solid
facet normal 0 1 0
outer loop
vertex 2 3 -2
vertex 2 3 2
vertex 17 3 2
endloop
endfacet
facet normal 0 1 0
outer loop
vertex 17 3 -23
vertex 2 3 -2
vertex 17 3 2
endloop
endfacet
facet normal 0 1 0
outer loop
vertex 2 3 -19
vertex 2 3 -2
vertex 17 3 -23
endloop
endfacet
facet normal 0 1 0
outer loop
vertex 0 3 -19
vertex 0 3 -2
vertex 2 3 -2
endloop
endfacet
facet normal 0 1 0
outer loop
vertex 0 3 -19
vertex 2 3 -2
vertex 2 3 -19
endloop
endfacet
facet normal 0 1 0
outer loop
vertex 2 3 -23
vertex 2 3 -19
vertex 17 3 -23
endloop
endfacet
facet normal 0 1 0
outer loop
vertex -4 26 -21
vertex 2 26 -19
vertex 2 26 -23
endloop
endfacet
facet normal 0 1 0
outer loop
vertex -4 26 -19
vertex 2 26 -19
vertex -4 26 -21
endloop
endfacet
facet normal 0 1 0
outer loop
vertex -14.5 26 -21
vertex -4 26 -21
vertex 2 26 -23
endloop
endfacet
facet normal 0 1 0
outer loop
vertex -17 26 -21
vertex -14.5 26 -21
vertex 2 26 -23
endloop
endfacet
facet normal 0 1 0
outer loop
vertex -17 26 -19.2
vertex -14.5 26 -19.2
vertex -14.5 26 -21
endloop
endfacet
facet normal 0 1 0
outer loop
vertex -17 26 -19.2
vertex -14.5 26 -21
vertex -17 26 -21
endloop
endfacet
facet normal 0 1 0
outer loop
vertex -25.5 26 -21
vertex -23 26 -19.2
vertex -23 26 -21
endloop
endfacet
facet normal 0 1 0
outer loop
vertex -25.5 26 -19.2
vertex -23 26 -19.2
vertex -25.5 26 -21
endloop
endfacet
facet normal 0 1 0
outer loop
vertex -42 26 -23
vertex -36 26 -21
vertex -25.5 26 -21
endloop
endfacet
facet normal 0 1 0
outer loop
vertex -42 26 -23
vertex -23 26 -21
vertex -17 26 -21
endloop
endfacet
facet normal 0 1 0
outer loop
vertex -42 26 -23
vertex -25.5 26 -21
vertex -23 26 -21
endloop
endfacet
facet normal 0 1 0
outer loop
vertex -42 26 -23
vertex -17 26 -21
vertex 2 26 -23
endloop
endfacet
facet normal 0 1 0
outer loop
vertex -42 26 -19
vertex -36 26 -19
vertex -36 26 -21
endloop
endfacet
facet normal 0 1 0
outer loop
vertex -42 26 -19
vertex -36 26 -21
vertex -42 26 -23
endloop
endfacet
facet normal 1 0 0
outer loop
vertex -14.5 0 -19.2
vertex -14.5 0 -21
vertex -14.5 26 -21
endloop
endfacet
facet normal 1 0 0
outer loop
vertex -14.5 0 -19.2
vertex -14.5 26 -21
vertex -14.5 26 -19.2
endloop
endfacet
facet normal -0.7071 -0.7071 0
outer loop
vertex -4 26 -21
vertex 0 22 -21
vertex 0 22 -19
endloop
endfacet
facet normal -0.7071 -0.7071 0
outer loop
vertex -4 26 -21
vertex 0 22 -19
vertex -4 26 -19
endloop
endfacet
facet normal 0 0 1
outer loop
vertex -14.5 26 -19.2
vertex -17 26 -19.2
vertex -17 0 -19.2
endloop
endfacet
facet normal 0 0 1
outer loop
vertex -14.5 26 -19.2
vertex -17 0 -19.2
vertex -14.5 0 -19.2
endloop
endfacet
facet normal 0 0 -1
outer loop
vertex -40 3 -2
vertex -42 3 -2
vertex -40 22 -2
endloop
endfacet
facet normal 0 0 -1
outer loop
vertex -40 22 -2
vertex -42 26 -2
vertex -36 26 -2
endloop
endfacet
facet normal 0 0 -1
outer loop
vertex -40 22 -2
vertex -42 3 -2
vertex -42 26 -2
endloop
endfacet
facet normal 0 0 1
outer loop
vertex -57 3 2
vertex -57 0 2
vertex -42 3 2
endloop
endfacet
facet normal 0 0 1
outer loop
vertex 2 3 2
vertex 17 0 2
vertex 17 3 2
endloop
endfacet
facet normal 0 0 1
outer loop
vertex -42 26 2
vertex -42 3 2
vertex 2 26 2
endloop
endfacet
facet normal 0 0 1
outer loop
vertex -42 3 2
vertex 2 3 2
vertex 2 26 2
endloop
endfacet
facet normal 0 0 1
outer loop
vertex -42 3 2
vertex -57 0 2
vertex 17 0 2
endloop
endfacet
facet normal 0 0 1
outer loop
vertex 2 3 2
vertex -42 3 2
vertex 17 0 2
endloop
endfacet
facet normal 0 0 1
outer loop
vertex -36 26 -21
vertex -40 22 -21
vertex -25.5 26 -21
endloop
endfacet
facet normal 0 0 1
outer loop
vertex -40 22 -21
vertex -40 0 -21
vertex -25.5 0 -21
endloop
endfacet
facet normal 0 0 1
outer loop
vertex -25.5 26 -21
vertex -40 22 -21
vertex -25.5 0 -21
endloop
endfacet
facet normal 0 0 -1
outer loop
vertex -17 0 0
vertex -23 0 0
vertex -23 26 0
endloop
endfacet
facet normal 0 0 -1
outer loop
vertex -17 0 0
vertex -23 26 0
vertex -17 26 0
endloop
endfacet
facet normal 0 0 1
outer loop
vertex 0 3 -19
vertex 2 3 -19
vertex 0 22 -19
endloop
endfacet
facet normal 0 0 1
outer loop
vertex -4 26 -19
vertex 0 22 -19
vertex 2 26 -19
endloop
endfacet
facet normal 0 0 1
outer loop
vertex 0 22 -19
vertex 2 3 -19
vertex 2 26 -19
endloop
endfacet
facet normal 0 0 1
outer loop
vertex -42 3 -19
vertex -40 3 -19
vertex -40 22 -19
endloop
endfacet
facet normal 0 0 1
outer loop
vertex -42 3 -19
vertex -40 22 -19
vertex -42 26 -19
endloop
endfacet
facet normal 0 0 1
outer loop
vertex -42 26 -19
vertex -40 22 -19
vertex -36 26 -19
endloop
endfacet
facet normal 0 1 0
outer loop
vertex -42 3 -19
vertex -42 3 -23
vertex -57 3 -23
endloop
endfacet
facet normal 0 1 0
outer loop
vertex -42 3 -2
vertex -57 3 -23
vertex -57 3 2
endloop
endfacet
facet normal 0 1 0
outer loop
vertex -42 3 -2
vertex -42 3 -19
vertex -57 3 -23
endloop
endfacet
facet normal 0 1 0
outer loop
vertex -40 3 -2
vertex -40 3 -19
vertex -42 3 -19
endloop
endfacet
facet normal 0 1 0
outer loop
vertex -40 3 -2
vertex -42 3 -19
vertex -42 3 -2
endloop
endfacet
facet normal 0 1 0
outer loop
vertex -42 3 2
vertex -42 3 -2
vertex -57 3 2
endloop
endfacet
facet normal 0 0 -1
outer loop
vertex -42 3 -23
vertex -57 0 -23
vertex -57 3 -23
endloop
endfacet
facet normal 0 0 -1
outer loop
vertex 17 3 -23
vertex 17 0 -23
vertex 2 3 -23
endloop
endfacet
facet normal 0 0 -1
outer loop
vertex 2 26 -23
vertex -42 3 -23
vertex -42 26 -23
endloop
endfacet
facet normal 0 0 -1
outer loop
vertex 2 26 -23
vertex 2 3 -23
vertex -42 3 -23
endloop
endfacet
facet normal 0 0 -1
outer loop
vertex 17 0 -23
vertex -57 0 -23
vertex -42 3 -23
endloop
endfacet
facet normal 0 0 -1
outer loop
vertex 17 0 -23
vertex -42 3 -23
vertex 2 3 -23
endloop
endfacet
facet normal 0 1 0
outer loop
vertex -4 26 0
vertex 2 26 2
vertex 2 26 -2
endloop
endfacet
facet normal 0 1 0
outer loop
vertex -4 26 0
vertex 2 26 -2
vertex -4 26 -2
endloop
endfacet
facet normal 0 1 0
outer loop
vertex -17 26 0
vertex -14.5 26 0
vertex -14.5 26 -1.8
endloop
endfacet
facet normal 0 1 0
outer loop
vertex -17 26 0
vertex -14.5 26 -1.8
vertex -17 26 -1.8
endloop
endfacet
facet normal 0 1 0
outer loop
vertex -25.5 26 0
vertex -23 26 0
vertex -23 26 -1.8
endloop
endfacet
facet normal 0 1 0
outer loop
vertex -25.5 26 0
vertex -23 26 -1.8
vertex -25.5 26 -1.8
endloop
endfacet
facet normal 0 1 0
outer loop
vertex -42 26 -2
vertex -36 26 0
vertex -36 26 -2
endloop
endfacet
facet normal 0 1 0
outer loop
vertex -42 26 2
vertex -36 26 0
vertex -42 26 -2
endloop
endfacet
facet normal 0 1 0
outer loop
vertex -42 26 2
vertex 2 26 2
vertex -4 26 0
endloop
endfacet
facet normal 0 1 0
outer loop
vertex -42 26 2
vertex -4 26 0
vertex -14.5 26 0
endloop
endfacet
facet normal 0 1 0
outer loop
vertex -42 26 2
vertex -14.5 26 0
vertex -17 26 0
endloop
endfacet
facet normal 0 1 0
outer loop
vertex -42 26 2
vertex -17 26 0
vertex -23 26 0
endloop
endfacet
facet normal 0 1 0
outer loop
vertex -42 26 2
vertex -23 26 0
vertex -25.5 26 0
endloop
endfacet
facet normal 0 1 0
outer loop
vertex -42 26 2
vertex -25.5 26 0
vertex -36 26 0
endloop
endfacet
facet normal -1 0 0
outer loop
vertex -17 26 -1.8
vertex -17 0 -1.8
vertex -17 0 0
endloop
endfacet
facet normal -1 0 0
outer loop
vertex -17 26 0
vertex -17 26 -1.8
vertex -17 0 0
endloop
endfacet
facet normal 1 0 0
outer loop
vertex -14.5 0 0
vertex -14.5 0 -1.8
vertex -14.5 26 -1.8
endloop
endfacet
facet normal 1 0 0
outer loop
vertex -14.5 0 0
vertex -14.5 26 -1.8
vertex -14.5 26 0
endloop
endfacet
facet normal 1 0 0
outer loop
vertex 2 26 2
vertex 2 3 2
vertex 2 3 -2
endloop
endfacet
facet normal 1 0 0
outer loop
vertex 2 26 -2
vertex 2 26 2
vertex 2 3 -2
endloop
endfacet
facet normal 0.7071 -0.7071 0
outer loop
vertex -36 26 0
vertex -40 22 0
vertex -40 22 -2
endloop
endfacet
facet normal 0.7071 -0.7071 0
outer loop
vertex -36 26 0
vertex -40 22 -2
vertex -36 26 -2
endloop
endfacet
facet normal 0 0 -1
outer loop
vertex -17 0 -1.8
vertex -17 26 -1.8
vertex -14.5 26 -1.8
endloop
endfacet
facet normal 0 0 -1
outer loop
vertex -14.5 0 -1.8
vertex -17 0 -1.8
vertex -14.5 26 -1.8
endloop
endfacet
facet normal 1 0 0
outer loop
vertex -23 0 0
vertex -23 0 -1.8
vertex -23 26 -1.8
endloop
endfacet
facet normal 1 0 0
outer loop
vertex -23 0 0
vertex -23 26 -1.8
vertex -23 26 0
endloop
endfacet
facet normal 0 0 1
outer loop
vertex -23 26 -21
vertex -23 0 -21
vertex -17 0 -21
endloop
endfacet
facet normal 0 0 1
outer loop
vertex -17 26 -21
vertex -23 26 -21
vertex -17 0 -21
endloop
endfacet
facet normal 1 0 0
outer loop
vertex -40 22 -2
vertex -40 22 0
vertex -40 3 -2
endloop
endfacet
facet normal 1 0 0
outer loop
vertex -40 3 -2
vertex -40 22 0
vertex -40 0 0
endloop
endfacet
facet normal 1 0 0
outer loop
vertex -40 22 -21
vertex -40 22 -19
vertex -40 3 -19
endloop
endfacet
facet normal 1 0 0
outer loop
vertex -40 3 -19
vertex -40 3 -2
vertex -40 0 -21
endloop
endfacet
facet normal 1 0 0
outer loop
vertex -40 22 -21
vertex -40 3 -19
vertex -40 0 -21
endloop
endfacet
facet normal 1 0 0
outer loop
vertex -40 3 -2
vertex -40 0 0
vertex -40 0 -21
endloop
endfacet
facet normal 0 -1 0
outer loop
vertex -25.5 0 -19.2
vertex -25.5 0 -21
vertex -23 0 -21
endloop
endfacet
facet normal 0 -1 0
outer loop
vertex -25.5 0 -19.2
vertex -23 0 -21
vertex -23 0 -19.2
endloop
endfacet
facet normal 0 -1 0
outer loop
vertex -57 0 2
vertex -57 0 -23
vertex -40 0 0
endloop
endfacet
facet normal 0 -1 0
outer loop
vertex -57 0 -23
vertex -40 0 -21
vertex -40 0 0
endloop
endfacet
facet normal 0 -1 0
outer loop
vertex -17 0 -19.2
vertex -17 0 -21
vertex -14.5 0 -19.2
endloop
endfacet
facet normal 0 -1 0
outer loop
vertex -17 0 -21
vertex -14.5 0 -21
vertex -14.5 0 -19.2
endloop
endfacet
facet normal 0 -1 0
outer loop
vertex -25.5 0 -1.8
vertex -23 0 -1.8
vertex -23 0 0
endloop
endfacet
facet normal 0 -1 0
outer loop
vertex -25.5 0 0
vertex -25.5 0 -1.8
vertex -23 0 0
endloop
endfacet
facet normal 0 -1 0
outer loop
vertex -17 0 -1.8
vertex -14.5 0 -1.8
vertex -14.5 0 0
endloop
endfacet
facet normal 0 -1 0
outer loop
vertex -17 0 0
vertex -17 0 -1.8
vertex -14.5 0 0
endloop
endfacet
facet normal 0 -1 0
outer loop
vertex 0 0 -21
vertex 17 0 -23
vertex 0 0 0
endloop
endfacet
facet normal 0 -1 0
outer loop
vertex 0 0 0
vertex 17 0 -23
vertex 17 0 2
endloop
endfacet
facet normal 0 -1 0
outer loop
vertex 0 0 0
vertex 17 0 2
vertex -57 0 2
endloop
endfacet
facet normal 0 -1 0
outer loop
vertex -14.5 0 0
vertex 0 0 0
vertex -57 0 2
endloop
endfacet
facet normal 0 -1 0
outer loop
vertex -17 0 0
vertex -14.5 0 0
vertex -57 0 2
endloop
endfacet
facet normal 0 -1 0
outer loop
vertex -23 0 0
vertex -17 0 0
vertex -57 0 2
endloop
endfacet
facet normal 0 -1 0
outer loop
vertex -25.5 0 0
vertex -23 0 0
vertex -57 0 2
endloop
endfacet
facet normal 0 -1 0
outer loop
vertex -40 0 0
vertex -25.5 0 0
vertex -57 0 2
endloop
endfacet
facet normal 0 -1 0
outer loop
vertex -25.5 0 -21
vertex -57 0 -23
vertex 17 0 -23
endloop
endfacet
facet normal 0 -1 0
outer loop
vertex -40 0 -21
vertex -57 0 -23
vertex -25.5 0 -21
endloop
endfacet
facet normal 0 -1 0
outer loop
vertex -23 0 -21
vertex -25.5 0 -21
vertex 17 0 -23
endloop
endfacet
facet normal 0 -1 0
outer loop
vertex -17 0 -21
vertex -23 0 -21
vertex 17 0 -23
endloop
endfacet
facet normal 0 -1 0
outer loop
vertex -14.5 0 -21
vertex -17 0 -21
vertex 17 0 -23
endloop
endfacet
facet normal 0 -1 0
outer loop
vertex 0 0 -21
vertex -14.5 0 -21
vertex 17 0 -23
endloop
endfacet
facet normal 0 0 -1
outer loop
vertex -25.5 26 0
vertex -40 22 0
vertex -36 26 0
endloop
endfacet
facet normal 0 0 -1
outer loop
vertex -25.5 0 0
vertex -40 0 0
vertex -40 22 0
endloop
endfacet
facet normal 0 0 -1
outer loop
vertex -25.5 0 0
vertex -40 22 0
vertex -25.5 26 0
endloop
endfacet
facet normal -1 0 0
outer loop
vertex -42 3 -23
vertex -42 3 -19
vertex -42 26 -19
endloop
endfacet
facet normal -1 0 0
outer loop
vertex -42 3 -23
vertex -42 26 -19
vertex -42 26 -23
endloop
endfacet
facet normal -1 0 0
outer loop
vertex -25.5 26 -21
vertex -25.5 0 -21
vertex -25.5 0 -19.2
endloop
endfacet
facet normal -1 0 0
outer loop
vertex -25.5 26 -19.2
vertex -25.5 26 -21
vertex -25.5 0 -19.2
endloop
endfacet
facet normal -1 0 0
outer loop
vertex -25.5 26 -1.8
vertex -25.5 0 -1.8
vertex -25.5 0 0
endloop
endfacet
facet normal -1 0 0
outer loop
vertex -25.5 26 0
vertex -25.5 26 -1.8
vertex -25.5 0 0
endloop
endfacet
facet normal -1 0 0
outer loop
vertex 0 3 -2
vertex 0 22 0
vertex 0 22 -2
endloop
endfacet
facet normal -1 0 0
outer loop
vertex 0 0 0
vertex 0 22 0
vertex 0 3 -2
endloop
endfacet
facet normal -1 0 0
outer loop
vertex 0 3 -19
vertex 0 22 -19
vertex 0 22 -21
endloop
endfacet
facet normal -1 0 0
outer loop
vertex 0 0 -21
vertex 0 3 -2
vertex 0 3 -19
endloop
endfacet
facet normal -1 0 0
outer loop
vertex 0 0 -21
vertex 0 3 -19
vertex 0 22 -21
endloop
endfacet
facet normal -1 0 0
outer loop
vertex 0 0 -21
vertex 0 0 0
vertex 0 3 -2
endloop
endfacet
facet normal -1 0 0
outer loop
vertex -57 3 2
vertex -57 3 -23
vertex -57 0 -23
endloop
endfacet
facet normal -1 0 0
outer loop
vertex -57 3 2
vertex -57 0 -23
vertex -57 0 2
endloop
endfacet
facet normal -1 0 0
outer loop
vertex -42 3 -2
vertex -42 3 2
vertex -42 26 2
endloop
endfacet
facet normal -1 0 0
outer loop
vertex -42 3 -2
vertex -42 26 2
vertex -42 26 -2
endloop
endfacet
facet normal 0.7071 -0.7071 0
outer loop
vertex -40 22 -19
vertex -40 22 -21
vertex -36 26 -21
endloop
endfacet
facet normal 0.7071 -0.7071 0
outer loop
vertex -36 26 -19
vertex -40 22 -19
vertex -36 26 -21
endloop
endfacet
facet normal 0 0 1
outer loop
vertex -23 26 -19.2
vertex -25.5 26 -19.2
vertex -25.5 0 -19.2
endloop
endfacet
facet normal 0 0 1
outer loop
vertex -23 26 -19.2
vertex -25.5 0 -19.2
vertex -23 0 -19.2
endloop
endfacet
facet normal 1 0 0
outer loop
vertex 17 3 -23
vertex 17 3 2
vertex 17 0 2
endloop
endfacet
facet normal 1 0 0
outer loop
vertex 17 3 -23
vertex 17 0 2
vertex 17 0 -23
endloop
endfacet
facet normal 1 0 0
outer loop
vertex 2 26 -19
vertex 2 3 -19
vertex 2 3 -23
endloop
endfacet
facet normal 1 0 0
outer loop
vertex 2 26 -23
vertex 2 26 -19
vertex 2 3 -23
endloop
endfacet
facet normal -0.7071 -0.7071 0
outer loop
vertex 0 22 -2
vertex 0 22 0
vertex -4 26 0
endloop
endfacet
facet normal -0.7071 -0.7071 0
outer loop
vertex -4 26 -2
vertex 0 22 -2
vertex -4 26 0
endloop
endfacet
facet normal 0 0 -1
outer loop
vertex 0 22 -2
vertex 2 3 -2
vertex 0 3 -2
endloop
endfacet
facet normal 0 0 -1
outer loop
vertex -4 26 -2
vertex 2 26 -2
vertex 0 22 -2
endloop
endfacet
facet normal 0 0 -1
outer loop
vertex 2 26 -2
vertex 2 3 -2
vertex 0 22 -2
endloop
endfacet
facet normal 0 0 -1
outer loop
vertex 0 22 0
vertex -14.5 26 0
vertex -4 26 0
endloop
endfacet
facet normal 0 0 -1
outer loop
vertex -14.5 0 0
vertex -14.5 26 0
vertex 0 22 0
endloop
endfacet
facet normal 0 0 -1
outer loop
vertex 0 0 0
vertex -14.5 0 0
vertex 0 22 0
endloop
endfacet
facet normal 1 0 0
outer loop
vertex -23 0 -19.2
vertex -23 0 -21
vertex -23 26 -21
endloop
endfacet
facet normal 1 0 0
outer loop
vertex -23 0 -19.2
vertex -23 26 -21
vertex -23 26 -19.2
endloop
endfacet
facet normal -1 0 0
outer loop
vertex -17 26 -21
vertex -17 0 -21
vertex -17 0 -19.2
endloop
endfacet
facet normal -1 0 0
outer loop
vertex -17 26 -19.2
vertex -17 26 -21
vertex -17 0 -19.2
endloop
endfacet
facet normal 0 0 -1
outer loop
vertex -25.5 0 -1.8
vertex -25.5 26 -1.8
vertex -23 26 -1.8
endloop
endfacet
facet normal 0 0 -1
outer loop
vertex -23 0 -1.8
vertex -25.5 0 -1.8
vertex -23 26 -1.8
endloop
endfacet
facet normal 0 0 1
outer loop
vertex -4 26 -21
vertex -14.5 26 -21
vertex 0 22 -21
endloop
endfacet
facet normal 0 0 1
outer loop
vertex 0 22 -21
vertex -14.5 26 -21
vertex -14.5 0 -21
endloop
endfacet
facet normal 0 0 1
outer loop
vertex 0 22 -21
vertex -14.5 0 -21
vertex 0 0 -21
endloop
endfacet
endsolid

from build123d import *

# Parameters (mm, degrees)
SKETCH1_W           = 44
SKETCH1_H           = 25
SKETCH1_W_2         = 40
SKETCH1_H_2         = 21
BOSS_EXTRUDE1_DEPTH = 26
BOSS_EXTRUDE2_DEPTH = 2
SKETCH3_W           = 17
SKETCH3_H           = 23
CUT_EXTRUDE1_DEPTH  = 57
SKETCH4_W           = 2.5
SKETCH4_H           = 1.8
BOSS_EXTRUDE3_DEPTH = 26
SKETCH8_W           = 25
SKETCH8_H           = 3
BOSS_EXTRUDE5_DEPTH = 15
SKETCH9_W           = 25
SKETCH9_H           = 3
BOSS_EXTRUDE6_DEPTH = 15


with BuildPart() as part:
    # Sketch1 → Boss-Extrude1 (new body)
    with BuildSketch(Plane(origin=(0, 0, 0), x_dir=(1, 0, 0), z_dir=(0, 1, 0))):
        with Locations((-20, 10.5)):
            Rectangle(SKETCH1_W, SKETCH1_H)
        with Locations((-20, 10.5)):
            Rectangle(SKETCH1_W_2, SKETCH1_H_2, mode=Mode.SUBTRACT)
    extrude(amount=BOSS_EXTRUDE1_DEPTH)

    # Sketch2 → Boss-Extrude2 (add)
    with BuildSketch(Plane.XY.offset(-21)):
        Polygon((-40, 22), (-36, 26), (-40, 26), align=None)
        Polygon((0, 26), (0, 22), (-4, 26), align=None)
    boss_extrude2 = extrude(amount=BOSS_EXTRUDE2_DEPTH)

    # Mirror1: Boss-Extrude2 across plane
    add(boss_extrude2.mirror(Plane(origin=(0, 0, -10.5), x_dir=(1, 0, 0), z_dir=(0, 0, -1))))

    # Sketch3 → Cut-Extrude1 (cut, symmetric)
    with BuildSketch(Plane(origin=(-40, 0, 0), x_dir=(0, 0, -1), z_dir=(1, 0, 0))):
        with Locations((10.5, 14.5)):
            Rectangle(SKETCH3_W, SKETCH3_H)
    extrude(amount=CUT_EXTRUDE1_DEPTH, both=True, mode=Mode.SUBTRACT)

    # Sketch4 → Boss-Extrude3 (add)
    with BuildSketch(Plane.XZ):
        with Locations((-24.25, -0.9)):
            Rectangle(SKETCH4_W, SKETCH4_H)
        with Locations((-15.75, -0.9)):
            Rectangle(SKETCH4_W, SKETCH4_H)
        with Locations((-15.75, -20.1)):
            Rectangle(SKETCH4_W, SKETCH4_H)
        with Locations((-24.25, -20.1)):
            Rectangle(SKETCH4_W, SKETCH4_H)
    extrude(amount=-BOSS_EXTRUDE3_DEPTH)

    # Sketch8 → Boss-Extrude5 (add)
    with BuildSketch(Plane(origin=(2, 0, 0), x_dir=(0, 0, -1), z_dir=(1, 0, 0))):
        with Locations((10.5, 1.5)):
            Rectangle(SKETCH8_W, SKETCH8_H)
    extrude(amount=BOSS_EXTRUDE5_DEPTH)

    # Sketch9 → Boss-Extrude6 (add)
    with BuildSketch(Plane.ZY.offset(42)):
        with Locations((-10.5, 1.5)):
            Rectangle(SKETCH9_W, SKETCH9_H)
    extrude(amount=BOSS_EXTRUDE6_DEPTH)


solid = part.part
